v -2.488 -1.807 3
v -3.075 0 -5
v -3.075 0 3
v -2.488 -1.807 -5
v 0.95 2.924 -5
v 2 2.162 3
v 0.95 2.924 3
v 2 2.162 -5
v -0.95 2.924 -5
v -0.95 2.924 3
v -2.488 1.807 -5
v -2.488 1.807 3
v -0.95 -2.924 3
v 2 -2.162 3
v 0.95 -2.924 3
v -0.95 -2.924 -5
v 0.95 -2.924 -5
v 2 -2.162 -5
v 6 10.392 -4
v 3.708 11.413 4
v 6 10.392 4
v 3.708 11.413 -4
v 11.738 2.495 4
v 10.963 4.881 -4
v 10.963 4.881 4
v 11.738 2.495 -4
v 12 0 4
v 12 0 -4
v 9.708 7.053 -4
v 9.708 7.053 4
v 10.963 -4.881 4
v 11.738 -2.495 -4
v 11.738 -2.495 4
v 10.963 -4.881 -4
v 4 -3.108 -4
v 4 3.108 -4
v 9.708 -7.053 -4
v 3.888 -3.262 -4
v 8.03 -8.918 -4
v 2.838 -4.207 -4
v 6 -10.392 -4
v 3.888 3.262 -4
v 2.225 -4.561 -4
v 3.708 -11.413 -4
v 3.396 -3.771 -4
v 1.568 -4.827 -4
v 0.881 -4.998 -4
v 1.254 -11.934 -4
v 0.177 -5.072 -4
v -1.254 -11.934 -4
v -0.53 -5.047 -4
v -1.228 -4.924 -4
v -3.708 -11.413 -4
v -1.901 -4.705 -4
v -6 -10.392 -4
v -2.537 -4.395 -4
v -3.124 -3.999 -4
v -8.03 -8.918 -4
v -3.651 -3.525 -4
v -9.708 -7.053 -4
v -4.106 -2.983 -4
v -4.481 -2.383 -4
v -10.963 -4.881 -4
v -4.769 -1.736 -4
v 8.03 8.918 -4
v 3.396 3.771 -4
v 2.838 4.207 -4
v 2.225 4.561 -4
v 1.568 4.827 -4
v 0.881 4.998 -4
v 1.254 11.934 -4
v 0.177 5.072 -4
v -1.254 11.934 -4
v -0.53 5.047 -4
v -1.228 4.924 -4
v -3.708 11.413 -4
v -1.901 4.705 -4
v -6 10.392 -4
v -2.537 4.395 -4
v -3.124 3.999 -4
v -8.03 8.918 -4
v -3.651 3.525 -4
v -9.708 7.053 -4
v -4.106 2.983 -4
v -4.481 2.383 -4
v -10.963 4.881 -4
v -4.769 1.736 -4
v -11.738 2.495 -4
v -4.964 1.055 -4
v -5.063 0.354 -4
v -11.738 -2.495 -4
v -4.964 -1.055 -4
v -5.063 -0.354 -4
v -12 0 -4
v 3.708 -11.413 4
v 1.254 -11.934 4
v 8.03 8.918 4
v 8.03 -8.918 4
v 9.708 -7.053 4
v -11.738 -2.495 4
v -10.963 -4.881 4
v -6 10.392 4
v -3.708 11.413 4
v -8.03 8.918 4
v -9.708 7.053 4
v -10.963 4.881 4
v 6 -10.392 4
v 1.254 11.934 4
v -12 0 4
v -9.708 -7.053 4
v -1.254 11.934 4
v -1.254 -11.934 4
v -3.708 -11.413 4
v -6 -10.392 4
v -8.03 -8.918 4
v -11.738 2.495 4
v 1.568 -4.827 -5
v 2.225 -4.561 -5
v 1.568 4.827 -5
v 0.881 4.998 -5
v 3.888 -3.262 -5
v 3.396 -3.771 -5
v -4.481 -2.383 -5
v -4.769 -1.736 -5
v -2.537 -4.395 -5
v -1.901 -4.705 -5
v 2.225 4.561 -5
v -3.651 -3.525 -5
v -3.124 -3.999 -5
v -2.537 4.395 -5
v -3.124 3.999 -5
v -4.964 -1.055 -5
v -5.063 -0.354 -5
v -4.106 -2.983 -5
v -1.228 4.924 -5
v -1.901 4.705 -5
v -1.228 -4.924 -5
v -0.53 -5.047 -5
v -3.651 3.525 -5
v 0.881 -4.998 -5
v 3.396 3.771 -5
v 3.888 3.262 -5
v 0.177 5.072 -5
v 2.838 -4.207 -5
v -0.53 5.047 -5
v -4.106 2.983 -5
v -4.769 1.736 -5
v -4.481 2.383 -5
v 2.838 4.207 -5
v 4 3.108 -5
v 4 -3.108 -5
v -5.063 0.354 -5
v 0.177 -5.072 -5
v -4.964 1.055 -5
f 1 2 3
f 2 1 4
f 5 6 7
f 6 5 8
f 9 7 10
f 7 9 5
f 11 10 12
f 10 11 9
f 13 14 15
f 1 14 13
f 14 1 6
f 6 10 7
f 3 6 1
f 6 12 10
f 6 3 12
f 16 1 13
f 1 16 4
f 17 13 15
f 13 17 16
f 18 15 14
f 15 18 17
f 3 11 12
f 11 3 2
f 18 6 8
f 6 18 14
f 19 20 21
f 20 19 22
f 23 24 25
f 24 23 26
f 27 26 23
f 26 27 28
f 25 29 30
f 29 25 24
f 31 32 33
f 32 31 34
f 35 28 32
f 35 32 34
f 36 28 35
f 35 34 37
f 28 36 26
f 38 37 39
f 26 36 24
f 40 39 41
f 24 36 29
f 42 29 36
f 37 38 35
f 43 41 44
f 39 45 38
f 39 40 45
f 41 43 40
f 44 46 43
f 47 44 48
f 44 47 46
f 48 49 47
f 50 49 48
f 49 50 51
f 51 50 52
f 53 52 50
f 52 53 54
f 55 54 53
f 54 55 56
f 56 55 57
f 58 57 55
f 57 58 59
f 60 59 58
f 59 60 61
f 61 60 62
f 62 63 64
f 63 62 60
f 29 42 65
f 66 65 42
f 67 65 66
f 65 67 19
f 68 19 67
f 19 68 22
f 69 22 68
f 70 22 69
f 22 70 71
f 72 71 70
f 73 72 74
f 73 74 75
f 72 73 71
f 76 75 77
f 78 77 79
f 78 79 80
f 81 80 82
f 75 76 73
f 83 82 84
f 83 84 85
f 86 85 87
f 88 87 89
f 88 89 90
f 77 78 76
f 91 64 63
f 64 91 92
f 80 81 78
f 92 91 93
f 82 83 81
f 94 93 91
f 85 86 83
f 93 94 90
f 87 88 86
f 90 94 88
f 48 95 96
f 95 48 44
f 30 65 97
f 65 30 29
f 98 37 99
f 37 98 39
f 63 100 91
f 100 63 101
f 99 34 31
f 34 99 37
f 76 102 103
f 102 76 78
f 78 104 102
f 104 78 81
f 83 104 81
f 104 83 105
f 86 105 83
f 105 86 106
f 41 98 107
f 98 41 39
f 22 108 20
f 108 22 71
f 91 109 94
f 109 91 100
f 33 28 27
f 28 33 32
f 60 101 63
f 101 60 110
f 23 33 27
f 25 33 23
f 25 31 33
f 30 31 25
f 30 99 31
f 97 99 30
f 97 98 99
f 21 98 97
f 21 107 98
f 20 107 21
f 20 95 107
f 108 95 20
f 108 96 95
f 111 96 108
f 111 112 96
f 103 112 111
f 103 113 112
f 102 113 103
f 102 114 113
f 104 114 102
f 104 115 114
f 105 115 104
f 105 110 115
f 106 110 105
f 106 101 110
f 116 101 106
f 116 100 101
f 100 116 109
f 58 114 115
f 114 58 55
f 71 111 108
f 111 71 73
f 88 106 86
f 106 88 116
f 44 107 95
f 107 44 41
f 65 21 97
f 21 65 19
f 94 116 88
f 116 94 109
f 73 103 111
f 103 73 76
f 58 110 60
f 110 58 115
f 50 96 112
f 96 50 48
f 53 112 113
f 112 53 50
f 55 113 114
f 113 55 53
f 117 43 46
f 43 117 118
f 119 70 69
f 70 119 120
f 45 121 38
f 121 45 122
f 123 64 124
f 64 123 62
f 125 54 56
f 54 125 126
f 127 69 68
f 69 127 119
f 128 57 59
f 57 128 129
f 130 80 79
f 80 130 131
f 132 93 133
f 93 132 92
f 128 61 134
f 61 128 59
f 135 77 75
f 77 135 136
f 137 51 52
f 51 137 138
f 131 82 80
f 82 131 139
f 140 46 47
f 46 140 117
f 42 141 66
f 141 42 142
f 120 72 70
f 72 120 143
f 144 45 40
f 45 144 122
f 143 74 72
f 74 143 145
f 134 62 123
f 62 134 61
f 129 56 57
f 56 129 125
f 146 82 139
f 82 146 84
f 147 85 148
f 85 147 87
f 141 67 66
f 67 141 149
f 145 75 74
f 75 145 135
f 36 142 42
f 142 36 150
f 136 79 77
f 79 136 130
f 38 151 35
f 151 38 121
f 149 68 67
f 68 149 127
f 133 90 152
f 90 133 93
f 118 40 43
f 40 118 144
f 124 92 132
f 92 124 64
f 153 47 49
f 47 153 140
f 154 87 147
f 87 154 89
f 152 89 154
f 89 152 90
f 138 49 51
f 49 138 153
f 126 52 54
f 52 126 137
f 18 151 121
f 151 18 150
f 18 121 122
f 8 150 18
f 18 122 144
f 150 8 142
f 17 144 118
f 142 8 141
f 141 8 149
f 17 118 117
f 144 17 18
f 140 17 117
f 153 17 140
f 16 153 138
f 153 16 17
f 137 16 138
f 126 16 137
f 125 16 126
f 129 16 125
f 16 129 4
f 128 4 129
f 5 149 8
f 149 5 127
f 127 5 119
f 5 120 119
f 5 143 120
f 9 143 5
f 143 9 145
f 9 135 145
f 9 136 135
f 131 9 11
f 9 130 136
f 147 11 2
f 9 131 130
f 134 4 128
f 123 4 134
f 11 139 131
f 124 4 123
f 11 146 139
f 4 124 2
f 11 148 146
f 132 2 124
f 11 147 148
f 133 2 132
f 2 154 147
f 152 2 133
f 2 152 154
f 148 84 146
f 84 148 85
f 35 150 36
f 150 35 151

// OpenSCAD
height = 8;
width = 12;

centerColumn = (6.15 / 2);

union() {
    difference() {
        cylinder(height, width, width, true);
        
        translate([0, 0, -1])
        difference() {
            cylinder(height, centerColumn, centerColumn, true);
            translate([12, 0, 0])
                cube(20, true);
        };
    };


    translate([0, 0, -3.5])
    difference() {
        difference() {
            cylinder(height - 5, centerColumn + 2, centerColumn + 2, true, $fn=45);
            translate([14, 0, 0])
                cube(20, true);
        };
        difference() {
            cylinder(height - 1.9, centerColumn, centerColumn, true);
            translate([12, 0, 0])
                cube(20, true);
        };
    }

}
